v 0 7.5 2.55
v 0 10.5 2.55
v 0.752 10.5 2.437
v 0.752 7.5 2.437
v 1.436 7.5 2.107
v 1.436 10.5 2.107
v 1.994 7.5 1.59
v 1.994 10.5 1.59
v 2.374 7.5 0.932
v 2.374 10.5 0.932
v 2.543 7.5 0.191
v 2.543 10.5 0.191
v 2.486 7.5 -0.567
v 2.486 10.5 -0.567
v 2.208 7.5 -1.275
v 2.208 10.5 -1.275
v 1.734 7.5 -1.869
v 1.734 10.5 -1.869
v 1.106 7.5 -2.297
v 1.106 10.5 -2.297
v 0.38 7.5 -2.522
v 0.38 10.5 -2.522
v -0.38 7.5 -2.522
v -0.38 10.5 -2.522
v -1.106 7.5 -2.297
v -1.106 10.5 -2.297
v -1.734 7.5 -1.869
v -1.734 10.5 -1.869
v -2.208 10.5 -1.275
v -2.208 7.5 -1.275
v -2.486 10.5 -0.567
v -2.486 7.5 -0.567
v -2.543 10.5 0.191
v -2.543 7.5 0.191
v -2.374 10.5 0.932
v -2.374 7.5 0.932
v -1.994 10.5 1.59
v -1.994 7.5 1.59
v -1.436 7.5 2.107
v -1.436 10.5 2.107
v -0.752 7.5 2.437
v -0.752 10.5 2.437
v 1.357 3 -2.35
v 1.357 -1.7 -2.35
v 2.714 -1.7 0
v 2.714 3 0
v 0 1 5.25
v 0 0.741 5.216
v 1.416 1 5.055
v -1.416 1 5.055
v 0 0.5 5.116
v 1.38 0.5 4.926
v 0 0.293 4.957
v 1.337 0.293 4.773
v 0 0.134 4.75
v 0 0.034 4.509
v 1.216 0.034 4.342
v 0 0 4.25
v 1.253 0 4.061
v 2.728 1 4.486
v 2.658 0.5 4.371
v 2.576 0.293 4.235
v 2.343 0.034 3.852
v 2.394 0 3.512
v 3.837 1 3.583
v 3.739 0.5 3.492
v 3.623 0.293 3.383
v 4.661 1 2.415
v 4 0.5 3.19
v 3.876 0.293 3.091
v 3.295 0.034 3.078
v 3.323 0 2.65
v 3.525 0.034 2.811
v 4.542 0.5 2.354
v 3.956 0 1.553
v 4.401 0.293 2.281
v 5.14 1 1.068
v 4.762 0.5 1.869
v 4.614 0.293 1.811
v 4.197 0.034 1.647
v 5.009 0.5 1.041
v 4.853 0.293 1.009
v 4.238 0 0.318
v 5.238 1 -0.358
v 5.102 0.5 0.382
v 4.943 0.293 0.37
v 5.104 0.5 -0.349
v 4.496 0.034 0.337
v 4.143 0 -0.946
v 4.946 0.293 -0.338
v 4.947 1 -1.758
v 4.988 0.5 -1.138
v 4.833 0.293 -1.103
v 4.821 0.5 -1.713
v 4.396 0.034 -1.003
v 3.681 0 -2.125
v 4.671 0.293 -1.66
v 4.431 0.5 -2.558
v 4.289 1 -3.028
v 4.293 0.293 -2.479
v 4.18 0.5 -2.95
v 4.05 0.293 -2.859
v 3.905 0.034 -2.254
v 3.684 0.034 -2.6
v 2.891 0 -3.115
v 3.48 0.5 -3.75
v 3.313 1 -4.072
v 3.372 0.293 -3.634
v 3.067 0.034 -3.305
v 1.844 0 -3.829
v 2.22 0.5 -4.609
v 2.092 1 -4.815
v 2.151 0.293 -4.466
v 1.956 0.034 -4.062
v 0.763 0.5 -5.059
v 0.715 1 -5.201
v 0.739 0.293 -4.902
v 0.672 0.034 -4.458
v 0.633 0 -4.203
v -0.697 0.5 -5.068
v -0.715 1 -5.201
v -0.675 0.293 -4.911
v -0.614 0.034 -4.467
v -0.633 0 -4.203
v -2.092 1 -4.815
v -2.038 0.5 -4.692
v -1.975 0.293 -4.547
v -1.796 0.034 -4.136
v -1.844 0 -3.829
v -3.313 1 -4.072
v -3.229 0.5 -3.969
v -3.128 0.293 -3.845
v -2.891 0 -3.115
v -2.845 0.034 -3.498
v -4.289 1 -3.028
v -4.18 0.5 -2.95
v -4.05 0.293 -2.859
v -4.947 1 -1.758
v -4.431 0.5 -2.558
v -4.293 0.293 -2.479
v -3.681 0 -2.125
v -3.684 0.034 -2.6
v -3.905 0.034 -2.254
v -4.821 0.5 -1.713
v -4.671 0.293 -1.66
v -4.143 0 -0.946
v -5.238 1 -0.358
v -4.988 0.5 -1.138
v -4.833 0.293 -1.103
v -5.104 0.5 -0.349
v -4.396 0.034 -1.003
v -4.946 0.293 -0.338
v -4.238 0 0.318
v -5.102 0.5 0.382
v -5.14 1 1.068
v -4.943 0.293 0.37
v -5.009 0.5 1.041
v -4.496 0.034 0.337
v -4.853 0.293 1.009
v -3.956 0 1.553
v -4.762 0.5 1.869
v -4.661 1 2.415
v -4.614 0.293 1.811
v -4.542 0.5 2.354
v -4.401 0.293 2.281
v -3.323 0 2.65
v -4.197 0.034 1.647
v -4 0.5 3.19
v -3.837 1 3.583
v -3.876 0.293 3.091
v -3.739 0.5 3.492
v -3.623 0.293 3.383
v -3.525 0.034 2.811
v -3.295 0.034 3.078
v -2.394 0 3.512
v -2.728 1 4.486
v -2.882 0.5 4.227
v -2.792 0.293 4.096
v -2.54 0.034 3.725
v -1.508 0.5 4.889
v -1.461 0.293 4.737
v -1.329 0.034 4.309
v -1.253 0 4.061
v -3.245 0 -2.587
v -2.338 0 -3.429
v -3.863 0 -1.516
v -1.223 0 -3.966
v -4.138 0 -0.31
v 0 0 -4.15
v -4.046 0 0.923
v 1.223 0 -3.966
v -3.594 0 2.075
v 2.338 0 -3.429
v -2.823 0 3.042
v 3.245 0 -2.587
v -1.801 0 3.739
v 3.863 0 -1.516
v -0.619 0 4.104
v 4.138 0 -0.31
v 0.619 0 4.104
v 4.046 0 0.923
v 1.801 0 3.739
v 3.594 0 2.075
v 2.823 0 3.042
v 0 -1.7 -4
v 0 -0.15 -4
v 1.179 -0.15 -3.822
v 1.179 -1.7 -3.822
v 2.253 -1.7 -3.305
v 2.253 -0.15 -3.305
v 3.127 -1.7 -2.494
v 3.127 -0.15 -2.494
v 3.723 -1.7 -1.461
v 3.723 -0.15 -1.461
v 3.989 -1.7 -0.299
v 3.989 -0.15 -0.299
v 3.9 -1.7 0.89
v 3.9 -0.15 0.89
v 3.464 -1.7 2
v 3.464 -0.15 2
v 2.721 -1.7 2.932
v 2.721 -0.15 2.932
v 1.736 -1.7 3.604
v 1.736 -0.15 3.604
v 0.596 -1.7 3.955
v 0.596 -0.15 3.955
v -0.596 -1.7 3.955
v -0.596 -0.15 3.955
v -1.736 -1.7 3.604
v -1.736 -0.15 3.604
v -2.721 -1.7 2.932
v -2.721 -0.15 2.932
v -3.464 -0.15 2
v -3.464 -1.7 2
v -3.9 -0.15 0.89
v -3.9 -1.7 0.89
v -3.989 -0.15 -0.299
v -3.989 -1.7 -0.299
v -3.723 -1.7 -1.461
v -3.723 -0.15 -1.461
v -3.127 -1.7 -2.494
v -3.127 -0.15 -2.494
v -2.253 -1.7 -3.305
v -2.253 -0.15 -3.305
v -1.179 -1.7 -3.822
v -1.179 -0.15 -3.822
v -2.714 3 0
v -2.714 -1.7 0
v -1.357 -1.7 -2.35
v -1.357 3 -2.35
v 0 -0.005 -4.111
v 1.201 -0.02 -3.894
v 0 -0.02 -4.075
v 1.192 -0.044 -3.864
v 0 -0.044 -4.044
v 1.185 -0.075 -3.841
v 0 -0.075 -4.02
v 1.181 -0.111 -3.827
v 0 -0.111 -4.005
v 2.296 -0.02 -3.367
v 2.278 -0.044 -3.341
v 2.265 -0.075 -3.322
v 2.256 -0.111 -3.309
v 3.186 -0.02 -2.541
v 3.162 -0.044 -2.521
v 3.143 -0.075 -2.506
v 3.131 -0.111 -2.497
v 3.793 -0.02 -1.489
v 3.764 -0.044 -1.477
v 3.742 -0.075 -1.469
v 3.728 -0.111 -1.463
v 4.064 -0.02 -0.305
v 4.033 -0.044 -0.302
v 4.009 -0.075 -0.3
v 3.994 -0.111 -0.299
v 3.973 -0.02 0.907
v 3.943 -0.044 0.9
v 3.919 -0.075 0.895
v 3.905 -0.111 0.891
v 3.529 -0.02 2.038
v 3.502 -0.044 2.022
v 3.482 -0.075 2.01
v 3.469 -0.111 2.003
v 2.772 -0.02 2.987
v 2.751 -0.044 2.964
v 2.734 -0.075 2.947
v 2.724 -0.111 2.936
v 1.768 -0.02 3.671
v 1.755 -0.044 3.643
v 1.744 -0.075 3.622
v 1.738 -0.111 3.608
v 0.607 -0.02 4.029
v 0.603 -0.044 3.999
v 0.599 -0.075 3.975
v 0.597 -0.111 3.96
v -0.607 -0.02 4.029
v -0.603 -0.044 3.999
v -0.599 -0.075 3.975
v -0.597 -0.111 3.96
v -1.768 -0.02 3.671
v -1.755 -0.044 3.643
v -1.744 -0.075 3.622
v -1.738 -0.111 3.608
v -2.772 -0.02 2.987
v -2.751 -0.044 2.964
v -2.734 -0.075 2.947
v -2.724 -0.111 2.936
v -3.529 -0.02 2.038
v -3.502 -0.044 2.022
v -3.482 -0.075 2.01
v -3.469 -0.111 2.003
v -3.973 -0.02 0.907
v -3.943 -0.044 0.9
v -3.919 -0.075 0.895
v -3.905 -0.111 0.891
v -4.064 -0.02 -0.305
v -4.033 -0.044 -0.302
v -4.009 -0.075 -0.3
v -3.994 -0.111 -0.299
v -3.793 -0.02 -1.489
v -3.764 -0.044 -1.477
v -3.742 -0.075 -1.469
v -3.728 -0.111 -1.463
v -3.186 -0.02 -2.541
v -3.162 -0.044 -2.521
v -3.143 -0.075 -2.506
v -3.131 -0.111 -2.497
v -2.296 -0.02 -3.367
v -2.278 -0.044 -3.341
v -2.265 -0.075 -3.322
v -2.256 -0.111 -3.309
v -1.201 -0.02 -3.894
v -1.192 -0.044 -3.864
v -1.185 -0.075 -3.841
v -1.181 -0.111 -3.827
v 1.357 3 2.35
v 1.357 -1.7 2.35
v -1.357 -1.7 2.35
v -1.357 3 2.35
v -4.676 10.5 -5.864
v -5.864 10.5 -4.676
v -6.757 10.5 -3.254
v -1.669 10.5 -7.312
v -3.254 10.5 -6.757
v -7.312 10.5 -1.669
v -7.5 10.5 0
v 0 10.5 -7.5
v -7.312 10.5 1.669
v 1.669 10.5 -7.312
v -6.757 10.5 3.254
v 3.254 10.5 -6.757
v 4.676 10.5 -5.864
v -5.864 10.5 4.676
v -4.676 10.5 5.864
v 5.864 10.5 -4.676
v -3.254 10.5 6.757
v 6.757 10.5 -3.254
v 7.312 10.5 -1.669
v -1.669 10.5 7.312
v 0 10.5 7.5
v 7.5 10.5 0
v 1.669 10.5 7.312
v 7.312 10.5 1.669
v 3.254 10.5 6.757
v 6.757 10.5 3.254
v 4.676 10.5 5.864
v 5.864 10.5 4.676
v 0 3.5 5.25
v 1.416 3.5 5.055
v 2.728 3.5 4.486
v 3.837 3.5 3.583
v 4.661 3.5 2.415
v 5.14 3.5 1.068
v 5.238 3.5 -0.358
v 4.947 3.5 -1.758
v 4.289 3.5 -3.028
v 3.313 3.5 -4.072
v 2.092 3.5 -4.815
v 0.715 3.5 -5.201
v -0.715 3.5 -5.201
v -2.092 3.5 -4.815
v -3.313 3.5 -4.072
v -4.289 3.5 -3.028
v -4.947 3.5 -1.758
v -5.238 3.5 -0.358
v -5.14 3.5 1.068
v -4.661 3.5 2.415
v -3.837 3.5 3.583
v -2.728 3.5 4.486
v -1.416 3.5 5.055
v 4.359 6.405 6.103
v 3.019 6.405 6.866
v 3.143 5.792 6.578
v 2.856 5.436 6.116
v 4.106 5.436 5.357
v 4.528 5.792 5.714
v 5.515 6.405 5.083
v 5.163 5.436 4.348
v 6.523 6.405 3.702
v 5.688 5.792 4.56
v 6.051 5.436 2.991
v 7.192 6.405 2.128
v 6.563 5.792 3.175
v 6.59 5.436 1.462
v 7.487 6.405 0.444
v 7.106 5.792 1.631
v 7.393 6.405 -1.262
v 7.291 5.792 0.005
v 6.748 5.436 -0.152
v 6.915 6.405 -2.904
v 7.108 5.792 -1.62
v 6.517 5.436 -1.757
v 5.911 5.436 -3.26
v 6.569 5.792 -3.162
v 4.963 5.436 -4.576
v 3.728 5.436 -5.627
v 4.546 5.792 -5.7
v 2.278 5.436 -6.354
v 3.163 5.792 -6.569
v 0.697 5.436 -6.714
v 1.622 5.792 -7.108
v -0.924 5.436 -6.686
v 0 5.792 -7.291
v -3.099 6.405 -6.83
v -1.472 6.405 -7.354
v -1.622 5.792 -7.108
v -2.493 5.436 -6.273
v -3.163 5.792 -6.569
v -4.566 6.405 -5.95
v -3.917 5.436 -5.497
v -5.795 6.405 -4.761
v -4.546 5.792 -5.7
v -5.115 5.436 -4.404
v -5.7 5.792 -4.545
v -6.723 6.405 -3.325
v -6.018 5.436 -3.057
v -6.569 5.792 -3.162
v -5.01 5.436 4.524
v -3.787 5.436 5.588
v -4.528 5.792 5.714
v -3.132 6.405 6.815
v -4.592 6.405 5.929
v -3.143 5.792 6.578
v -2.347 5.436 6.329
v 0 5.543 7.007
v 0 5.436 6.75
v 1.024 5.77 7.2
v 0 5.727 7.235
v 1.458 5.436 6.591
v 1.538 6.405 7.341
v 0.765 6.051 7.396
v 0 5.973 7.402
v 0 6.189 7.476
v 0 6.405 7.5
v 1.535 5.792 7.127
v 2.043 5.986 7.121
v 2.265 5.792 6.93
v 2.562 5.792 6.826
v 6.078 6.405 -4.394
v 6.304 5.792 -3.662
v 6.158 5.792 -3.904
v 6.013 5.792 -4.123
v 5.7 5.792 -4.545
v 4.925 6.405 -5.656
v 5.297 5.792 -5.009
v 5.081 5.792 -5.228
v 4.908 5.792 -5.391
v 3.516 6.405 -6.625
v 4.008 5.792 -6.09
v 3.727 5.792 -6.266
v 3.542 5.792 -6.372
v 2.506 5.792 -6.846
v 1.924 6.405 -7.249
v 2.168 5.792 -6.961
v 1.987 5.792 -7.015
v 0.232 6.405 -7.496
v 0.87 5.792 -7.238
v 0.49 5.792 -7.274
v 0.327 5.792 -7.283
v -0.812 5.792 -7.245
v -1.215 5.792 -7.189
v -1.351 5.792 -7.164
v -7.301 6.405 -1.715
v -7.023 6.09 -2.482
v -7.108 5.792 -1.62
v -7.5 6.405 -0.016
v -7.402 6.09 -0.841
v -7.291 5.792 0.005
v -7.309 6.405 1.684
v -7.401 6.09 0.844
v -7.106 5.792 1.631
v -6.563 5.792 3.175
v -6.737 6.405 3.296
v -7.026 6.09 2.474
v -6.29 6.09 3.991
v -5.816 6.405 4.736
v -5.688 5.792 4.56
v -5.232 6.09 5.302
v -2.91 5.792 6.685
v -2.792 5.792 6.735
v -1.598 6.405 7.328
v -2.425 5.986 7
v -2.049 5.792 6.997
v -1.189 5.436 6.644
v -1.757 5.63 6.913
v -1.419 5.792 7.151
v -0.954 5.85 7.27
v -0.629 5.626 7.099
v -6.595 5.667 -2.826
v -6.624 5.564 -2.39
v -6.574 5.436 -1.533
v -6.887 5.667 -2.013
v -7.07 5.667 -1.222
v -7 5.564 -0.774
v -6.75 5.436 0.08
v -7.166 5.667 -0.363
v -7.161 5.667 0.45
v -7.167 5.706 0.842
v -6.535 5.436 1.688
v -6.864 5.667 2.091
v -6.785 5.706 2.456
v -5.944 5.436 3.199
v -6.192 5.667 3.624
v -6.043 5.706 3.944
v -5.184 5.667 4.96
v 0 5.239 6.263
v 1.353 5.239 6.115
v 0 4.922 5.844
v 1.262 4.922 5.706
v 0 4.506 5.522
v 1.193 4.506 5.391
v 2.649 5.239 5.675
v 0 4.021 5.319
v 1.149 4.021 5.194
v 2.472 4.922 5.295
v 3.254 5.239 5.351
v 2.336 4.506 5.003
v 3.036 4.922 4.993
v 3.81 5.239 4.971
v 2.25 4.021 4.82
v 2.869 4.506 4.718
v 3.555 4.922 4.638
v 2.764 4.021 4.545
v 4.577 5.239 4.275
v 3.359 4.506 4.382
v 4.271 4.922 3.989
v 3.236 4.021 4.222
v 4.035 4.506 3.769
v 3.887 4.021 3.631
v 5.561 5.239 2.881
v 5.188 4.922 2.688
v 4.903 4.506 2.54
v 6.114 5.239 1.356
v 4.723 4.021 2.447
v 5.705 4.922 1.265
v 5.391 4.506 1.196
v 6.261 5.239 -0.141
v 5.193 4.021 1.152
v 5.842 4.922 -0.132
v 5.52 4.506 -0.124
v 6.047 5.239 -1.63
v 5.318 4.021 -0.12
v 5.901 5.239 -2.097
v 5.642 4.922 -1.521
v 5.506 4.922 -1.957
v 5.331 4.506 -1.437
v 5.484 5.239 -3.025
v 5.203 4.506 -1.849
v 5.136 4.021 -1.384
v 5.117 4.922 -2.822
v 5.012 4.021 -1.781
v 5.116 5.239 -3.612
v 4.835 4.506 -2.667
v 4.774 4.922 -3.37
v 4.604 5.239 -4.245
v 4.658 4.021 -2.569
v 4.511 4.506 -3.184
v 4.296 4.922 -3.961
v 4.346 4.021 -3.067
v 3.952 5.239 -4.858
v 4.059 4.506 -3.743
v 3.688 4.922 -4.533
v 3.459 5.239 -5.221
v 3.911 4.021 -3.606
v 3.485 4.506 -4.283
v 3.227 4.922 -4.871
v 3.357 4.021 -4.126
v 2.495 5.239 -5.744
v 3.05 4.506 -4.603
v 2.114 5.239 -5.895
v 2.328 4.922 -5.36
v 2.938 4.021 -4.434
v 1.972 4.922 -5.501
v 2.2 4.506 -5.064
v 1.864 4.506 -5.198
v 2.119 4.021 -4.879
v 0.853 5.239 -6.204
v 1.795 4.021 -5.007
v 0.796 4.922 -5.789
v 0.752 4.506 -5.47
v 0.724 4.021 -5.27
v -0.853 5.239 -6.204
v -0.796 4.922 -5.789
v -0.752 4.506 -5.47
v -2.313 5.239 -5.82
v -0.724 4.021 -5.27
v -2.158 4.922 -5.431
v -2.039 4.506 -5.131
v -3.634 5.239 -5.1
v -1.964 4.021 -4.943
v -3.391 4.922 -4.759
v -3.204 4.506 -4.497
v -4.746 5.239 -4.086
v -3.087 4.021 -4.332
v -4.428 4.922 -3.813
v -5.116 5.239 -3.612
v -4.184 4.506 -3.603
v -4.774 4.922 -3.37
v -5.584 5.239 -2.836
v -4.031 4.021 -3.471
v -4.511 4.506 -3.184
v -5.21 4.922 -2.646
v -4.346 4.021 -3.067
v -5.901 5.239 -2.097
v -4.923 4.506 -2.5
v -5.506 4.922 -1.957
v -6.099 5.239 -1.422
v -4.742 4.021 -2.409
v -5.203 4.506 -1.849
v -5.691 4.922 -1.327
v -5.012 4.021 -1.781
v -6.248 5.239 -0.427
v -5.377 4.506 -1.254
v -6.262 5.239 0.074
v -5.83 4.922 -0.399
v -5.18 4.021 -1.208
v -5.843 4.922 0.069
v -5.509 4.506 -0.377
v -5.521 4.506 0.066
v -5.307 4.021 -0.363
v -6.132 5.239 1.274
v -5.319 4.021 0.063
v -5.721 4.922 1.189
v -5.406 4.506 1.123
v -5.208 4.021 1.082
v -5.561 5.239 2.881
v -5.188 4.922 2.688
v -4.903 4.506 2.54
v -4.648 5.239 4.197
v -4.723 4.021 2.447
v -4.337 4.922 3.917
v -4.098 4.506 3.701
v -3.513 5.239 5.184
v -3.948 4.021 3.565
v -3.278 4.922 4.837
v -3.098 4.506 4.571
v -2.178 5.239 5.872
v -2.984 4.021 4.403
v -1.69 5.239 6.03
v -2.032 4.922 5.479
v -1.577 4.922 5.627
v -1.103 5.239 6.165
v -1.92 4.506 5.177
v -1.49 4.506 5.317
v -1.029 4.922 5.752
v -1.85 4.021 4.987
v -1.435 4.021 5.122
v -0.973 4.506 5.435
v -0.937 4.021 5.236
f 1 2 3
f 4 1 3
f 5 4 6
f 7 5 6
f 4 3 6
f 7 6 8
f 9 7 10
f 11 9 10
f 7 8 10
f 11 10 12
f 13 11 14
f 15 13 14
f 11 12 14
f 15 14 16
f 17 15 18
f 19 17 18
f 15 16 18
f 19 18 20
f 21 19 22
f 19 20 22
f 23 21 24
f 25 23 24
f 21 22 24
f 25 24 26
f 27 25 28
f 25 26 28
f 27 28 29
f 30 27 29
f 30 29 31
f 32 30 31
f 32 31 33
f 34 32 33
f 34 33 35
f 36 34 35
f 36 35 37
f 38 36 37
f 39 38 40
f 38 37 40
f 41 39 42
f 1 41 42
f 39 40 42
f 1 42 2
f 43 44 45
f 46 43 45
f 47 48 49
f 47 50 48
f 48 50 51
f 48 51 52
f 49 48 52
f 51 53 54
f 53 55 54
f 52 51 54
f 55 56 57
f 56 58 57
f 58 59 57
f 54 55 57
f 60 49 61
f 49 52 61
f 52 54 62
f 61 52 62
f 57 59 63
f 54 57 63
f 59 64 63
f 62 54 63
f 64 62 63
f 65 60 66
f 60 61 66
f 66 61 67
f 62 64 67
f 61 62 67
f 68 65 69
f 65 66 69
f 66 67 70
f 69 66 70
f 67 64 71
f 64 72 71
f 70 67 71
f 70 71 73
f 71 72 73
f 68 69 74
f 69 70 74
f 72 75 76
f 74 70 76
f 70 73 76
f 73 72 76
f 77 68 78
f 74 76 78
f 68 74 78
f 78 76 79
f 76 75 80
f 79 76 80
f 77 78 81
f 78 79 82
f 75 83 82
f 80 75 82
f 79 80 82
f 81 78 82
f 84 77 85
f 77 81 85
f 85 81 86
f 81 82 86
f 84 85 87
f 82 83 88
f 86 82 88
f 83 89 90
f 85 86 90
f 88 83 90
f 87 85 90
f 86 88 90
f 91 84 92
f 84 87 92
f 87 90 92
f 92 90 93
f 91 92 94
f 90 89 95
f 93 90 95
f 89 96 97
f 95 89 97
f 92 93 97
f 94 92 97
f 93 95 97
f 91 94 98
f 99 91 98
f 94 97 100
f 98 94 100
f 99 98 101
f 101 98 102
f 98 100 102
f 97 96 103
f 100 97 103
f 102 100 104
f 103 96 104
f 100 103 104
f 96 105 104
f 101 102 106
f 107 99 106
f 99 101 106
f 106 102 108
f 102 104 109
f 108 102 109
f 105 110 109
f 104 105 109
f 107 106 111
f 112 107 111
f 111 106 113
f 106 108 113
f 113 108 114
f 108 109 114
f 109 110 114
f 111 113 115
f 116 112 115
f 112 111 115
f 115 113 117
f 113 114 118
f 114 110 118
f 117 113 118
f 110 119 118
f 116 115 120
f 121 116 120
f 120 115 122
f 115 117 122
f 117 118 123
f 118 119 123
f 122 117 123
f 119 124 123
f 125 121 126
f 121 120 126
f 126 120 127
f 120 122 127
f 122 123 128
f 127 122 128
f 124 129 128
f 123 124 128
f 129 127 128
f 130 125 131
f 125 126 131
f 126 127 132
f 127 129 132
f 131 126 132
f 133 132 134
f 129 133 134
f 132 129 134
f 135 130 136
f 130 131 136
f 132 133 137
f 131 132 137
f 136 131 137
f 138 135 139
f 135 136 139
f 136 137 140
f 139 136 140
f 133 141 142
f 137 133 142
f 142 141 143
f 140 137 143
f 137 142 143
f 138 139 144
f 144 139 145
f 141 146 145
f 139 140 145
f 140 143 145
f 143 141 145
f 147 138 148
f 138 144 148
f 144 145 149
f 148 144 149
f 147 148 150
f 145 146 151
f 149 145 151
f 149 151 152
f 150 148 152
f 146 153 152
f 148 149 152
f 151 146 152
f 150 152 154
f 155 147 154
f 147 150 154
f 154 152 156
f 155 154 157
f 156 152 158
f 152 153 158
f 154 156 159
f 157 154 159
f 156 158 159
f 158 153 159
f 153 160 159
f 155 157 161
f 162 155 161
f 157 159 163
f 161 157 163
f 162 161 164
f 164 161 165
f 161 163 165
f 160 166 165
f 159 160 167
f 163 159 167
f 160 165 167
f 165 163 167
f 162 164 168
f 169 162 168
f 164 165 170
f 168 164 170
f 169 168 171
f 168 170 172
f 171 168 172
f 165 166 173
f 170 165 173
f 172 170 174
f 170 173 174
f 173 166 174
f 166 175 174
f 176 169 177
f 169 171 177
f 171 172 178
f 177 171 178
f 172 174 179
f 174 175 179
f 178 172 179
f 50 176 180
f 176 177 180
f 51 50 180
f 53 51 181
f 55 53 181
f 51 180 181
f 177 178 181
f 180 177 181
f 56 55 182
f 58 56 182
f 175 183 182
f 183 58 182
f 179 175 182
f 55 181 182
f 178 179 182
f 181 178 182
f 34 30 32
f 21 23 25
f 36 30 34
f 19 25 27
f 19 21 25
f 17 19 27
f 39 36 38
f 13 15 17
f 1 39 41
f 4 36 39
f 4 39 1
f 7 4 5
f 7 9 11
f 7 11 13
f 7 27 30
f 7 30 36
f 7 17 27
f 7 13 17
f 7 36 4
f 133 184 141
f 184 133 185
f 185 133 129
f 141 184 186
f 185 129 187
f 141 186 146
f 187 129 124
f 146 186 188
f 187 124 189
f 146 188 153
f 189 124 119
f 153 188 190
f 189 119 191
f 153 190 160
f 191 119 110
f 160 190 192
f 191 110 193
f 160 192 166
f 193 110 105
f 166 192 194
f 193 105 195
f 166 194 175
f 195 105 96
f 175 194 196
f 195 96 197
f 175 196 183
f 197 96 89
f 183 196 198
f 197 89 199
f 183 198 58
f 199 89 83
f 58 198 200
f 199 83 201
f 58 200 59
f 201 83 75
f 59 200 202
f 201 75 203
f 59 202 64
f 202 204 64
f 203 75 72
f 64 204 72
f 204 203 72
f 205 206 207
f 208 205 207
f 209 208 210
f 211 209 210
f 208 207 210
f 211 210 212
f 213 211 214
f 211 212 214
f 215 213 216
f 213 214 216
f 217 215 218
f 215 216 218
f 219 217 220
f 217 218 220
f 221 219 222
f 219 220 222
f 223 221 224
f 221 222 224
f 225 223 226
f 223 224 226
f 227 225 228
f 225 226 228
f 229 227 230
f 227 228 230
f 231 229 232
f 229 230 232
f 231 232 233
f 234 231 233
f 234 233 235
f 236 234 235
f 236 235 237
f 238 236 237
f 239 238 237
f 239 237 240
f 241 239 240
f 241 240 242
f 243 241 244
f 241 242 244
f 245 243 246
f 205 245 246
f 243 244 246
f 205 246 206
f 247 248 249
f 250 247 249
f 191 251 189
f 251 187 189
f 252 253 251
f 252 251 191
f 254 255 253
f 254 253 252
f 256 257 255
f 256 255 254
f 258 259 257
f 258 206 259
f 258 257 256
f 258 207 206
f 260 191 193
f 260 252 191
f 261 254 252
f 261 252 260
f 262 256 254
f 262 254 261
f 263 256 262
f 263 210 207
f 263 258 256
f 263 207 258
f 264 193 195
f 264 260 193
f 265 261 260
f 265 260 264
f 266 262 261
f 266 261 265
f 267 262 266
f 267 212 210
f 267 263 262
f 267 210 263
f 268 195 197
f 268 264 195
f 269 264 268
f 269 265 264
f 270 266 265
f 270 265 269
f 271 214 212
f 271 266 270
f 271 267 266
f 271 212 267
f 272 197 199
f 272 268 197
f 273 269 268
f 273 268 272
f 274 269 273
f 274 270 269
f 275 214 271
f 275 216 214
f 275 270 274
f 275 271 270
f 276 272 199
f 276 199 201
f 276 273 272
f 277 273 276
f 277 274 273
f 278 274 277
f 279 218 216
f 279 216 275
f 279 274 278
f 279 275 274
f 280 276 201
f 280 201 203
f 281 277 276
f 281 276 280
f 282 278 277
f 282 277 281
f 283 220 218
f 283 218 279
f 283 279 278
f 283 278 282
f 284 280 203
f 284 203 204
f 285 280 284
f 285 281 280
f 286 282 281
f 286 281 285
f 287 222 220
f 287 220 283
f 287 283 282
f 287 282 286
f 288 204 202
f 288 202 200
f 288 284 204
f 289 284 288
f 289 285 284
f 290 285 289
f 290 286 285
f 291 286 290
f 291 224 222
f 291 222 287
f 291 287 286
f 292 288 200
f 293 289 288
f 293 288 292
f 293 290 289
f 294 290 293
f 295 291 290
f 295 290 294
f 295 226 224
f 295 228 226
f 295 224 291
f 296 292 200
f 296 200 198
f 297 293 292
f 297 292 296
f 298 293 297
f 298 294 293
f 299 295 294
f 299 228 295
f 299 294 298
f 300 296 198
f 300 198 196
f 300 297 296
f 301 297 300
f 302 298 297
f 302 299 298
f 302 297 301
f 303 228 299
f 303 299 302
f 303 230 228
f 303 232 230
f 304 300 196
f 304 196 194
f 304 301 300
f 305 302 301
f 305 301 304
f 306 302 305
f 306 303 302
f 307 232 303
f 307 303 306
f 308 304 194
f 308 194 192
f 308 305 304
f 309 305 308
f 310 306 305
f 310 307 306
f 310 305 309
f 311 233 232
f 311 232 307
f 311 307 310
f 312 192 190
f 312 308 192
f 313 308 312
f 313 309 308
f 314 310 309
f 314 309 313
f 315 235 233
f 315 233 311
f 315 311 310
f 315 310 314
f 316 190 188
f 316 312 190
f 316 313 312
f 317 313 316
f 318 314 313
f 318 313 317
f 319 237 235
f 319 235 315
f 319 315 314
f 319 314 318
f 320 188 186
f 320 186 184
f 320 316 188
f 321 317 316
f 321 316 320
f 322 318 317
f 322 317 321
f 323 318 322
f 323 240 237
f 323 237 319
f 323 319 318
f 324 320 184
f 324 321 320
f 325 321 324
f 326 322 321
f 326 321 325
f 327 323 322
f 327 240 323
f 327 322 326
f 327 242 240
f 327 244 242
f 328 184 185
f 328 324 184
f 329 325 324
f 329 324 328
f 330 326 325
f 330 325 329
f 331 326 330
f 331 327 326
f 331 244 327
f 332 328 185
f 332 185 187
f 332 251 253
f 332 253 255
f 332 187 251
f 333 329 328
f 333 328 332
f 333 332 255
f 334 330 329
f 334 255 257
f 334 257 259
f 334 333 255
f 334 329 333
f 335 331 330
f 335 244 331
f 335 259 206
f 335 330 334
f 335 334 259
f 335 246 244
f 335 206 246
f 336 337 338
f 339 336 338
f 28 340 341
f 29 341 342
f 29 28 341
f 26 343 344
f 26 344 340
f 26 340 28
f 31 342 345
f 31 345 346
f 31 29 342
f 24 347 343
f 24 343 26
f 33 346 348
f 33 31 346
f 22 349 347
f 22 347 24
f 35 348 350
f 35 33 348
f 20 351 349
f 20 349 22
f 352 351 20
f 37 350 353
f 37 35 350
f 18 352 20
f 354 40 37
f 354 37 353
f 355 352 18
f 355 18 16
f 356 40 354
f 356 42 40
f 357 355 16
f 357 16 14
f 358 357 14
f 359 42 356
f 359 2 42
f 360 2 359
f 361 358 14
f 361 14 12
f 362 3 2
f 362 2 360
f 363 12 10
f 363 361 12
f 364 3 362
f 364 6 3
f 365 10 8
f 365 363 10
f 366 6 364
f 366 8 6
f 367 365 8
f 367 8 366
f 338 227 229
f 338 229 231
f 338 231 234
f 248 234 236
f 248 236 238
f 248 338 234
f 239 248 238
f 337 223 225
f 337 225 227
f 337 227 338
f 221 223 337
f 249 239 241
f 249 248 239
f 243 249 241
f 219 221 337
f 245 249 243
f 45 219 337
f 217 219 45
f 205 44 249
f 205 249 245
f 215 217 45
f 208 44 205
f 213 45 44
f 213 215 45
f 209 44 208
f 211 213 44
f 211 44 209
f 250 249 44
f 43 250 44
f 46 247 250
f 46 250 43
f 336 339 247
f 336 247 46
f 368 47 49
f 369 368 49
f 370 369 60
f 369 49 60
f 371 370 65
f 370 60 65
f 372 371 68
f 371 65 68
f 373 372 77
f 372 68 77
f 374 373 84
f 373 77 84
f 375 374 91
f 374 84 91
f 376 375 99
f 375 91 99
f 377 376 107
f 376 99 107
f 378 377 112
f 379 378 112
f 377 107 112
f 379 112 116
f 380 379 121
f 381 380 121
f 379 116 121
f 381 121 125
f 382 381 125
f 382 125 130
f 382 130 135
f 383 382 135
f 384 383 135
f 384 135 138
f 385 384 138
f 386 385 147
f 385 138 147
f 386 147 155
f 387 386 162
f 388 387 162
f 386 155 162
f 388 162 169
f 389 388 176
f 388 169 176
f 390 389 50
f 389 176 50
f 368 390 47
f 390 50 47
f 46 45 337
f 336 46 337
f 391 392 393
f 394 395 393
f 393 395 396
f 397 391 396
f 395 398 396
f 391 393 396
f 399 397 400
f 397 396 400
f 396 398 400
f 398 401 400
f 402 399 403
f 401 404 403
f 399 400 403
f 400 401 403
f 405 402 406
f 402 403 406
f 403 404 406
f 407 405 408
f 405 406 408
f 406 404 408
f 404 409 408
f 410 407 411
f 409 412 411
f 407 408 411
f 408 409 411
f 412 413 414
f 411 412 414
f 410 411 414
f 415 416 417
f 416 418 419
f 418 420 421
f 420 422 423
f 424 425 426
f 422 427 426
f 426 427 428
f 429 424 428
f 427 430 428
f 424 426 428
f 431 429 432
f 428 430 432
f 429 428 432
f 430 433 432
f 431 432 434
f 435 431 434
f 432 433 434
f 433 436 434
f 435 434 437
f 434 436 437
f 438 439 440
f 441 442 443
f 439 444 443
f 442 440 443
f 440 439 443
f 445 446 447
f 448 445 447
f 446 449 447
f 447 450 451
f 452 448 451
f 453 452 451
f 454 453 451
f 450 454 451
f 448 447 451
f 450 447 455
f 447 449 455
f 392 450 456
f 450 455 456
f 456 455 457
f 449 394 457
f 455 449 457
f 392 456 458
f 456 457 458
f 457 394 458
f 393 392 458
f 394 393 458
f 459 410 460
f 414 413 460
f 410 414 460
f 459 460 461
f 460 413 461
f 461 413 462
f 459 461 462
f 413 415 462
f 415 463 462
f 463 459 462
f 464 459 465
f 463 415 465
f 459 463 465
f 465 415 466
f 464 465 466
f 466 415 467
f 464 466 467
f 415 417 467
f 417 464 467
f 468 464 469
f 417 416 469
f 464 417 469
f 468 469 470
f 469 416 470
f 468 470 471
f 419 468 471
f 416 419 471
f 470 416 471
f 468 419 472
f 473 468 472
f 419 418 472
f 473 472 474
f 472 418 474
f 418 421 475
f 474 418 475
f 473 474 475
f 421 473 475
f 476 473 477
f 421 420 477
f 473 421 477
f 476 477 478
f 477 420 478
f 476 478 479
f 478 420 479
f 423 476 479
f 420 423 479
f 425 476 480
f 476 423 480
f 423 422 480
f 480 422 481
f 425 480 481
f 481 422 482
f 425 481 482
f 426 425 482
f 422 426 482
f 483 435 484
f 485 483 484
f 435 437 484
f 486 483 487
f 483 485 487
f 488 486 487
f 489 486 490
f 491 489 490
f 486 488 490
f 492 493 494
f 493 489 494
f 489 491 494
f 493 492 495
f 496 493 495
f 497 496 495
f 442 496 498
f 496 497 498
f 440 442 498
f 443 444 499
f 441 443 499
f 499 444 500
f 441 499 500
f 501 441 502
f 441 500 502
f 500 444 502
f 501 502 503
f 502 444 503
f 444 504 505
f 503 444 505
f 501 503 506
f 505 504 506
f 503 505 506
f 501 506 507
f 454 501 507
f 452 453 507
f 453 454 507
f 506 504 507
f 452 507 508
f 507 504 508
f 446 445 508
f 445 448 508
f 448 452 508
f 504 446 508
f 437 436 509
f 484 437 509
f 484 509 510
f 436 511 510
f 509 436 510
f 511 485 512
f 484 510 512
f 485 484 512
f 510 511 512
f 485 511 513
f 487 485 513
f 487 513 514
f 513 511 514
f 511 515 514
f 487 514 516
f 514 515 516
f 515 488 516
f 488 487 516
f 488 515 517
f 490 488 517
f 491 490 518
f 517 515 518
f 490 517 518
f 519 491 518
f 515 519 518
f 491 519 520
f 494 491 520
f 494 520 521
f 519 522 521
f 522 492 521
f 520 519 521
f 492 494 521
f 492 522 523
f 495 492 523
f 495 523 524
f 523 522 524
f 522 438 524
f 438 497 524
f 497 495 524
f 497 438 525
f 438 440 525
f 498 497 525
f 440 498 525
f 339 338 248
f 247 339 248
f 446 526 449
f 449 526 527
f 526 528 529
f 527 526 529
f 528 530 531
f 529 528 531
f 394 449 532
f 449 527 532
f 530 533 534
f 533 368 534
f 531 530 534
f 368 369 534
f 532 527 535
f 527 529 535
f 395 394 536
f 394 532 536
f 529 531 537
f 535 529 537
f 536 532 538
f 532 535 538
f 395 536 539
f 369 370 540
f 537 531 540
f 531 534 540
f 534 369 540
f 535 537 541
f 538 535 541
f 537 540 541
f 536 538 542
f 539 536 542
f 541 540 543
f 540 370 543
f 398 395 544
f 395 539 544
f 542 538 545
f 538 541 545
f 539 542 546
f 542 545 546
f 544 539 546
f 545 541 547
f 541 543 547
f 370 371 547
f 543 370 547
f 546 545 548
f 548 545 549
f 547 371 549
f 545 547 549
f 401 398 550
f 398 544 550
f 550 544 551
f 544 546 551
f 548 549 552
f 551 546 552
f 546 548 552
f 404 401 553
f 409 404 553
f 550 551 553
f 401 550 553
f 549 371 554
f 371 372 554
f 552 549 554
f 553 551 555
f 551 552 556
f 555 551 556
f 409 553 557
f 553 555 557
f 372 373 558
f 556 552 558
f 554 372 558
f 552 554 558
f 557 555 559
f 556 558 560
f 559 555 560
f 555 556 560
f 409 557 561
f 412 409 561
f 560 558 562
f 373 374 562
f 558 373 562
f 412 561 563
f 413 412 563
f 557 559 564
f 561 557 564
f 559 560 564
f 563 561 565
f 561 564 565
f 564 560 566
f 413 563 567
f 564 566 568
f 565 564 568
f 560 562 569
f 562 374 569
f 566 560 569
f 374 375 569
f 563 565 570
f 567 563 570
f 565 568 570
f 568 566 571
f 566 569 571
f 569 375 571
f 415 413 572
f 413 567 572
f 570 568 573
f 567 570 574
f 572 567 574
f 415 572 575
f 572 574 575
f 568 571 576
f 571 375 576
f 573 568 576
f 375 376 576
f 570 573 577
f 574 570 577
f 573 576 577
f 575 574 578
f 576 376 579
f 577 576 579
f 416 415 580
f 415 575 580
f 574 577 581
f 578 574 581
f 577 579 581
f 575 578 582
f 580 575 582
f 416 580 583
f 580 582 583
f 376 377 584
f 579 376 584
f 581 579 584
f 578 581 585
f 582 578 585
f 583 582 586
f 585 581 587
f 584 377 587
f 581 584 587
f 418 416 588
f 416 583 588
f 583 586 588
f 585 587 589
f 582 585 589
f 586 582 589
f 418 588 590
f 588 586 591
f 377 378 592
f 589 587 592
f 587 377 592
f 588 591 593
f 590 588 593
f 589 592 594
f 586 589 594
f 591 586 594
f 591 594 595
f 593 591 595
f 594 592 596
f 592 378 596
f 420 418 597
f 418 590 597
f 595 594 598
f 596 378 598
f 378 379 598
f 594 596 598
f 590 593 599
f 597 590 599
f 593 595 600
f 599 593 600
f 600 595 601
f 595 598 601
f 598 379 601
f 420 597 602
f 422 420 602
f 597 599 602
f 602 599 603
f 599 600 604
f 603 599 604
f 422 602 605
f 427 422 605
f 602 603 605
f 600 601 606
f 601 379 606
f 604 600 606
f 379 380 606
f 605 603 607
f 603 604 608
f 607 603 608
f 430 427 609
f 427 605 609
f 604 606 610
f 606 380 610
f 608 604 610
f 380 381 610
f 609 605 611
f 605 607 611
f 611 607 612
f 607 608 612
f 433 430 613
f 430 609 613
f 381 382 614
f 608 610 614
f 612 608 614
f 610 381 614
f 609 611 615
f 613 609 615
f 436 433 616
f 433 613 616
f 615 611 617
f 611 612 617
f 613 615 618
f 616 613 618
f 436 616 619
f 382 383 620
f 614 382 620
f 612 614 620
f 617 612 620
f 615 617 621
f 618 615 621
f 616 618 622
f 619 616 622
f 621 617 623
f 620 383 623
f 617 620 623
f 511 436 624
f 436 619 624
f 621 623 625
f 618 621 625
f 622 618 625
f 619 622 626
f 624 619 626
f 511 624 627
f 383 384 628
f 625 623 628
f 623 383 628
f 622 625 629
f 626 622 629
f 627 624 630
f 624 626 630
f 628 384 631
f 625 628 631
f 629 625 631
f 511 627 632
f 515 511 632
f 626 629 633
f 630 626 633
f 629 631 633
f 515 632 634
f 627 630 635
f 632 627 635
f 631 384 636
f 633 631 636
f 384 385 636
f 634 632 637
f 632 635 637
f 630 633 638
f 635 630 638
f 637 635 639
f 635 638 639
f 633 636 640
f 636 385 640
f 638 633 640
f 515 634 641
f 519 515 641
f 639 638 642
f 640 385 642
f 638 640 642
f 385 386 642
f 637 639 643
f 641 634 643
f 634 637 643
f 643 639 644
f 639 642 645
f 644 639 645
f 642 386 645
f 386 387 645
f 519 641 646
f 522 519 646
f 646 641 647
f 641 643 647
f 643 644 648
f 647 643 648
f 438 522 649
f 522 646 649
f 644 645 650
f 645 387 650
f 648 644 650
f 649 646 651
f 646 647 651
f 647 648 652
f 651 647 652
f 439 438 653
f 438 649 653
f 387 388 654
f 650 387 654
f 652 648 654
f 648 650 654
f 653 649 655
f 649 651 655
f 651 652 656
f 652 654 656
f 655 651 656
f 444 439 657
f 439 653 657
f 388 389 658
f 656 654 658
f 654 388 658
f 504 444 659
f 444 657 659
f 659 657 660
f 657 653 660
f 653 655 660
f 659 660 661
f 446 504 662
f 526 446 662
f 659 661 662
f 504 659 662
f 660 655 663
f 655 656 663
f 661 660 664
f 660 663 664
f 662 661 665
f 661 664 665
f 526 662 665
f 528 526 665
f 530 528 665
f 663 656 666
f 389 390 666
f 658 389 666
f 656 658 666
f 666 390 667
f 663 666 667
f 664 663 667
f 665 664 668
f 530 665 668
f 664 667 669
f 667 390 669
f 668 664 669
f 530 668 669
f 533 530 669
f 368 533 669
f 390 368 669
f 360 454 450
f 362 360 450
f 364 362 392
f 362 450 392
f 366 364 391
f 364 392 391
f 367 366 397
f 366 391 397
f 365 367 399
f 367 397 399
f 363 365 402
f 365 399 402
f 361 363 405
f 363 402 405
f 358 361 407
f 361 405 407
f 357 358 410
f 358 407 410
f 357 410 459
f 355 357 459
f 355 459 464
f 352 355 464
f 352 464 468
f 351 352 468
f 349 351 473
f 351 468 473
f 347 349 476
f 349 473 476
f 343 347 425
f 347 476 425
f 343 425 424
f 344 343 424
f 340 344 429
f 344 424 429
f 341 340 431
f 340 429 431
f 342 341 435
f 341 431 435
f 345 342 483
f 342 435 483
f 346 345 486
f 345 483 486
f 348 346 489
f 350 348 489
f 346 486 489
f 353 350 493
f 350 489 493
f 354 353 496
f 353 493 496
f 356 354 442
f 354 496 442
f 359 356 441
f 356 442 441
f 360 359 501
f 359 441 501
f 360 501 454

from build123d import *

# Parameters (mm, degrees)
SKETCH1_R           = 5.25
BOSS_EXTRUDE1_DEPTH = 5.5
SKETCH2_R           = 4
BOSS_EXTRUDE2_DEPTH = 1.7
FILLET1_R           = 0.15
SKETCH3_R           = 7.5
BOSS_EXTRUDE3_DEPTH = 5
SKETCH4_R           = 2.55
CUT_EXTRUDE1_DEPTH  = 3
CUT_EXTRUDE2_DEPTH  = 4.7
FILLET2_R           = 2
FILLET3_R           = 1
FILLET4_R           = 1


with BuildPart() as part:
    # Sketch1 → Boss-Extrude1 (new body)
    with BuildSketch(Plane(origin=(0, 0, 0), x_dir=(1, 0, 0), z_dir=(0, 1, 0))):
        with Locations(Location((0, 0, 0), (0, 0, 270))):
            Circle(SKETCH1_R)
    extrude(amount=BOSS_EXTRUDE1_DEPTH)

    # Sketch2 → Boss-Extrude2 (add)
    with BuildSketch(Plane.XZ):
        with Locations(Location((0, 0, 0), (0, 0, 270))):
            Circle(SKETCH2_R)
    extrude(amount=BOSS_EXTRUDE2_DEPTH)

    # Fillet1
    fillet1_edges = [part.edges().sort_by_distance(p)[0] for p in [
        (0, 0, 4),
    ]]
    fillet(fillet1_edges, radius=FILLET1_R)

    # Sketch3 → Boss-Extrude3 (add)
    with BuildSketch(Plane(origin=(0, 5.5, 0), x_dir=(1, 0, 0), z_dir=(0, 1, 0))):
        with Locations(Location((0, 0, 0), (0, 0, 270))):
            Circle(SKETCH3_R)
    extrude(amount=BOSS_EXTRUDE3_DEPTH)

    # Sketch4 → Cut-Extrude1 (cut)
    with BuildSketch(Plane(origin=(0, 10.5, 0), x_dir=(1, 0, 0), z_dir=(0, 1, 0))):
        with Locations(Location((0, 0, 0), (0, 0, 270))):
            Circle(SKETCH4_R)
    extrude(amount=-CUT_EXTRUDE1_DEPTH, mode=Mode.SUBTRACT)

    # Sketch5 → Cut-Extrude2 (cut)
    with BuildSketch(Plane.XZ.offset(1.7)):
        Polygon((2.713546265, 0), (1.356773133, 2.35), (-1.356773133, 2.35), (-2.713546265, 0), (-1.356773133, -2.35), (1.356773133, -2.35), align=None)
    extrude(amount=-CUT_EXTRUDE2_DEPTH, mode=Mode.SUBTRACT)

    # Fillet2
    fillet2_edges = [part.edges().sort_by_distance(p)[0] for p in [
        (0, 5.5, -5.25),
    ]]
    fillet(fillet2_edges, radius=FILLET2_R)

    # Fillet3
    fillet3_edges = [part.edges().sort_by_distance(p)[0] for p in [
        (0, 0, -5.25),
    ]]
    fillet(fillet3_edges, radius=FILLET3_R)

    # Fillet4
    fillet4_edges = [part.edges().sort_by_distance(p)[0] for p in [
        (0, 5.5, -7.5),
    ]]
    fillet(fillet4_edges, radius=FILLET4_R)


solid = part.part
